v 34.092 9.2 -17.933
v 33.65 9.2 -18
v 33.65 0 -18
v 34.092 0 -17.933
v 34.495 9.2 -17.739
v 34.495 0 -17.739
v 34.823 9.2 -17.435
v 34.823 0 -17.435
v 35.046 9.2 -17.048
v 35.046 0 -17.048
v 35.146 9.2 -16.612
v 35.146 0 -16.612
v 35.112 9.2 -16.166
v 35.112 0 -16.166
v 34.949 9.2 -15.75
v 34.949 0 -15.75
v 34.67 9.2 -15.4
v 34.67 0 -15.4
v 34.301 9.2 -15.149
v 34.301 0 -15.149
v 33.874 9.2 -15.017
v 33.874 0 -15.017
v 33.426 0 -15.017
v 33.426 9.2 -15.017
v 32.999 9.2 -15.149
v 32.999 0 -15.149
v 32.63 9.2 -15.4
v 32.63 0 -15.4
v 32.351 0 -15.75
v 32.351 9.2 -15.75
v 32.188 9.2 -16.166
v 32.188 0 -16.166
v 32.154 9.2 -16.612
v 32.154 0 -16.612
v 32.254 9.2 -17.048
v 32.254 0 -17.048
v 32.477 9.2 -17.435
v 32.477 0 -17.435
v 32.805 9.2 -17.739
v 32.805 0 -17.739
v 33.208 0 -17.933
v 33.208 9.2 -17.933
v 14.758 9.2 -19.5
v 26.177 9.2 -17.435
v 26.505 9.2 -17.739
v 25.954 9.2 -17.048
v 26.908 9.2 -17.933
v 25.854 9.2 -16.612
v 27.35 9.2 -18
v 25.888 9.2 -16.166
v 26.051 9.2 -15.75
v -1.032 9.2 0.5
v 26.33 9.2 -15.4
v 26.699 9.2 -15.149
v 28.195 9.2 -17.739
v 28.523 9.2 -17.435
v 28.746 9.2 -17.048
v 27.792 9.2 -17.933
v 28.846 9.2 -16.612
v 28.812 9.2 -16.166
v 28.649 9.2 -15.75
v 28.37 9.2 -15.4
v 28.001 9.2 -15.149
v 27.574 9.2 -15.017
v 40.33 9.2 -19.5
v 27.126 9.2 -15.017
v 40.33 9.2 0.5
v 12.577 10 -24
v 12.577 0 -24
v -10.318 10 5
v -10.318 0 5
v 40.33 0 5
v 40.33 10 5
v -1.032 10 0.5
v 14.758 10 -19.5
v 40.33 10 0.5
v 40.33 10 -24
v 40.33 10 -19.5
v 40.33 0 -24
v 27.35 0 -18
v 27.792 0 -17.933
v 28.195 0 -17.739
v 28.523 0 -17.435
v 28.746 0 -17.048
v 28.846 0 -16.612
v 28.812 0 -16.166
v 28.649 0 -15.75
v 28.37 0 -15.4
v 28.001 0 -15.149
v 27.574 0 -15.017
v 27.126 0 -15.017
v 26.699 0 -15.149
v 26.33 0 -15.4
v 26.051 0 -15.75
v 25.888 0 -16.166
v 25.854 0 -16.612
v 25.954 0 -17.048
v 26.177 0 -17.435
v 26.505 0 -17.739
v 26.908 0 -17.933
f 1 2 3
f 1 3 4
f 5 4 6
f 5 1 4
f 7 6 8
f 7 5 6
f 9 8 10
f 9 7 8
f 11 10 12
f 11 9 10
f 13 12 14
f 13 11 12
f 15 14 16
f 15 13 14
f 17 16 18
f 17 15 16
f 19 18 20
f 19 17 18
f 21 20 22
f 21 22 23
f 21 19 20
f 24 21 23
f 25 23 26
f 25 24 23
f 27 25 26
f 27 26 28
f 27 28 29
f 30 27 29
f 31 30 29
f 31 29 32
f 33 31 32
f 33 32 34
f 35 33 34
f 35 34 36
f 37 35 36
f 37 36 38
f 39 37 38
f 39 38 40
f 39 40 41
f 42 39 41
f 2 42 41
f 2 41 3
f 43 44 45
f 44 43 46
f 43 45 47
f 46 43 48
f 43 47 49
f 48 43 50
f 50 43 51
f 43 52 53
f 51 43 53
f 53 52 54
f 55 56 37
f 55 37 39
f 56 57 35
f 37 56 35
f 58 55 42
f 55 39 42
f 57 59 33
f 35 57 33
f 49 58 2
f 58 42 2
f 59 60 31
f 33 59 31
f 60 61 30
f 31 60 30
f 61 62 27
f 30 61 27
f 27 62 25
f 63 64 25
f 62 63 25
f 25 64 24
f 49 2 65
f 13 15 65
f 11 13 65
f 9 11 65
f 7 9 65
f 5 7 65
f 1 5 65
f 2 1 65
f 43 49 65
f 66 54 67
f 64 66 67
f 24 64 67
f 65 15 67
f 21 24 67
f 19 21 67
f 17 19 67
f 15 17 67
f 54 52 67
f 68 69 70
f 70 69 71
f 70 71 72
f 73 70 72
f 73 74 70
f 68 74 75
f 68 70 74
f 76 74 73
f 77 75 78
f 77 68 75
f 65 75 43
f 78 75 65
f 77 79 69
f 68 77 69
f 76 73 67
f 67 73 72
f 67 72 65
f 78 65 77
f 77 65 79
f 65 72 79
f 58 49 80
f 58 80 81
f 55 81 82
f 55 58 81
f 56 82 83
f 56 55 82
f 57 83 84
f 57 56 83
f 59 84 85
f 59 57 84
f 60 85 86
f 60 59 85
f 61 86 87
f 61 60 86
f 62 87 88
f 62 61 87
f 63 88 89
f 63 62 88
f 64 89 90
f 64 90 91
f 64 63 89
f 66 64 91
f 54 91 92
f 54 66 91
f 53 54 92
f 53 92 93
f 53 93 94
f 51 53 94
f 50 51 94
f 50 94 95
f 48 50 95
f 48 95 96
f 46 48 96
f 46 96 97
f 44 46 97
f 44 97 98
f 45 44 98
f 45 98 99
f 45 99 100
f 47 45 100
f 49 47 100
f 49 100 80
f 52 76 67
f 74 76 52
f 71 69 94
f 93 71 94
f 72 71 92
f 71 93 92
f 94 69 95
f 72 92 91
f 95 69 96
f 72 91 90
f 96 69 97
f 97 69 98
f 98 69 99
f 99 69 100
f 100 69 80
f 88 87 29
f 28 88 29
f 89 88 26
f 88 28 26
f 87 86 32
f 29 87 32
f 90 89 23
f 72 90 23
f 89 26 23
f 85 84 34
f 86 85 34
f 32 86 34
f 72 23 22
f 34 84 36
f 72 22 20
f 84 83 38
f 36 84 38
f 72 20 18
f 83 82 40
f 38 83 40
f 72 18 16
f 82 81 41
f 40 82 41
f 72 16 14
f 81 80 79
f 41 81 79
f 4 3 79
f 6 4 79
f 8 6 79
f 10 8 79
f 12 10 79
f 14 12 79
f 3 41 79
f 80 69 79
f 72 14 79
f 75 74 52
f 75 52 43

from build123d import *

# Parameters (mm, degrees)
BOSS_EXTRUDE1_DEPTH = 10
CUT_EXTRUDE1_START  = -10
SKETCH2_R           = 1.5
CUT_EXTRUDE1_DEPTH  = 0.8
CUT_EXTRUDE2_START  = -15
SKETCH2_3_R         = 1.5
CUT_EXTRUDE2_DEPTH  = 15
CUT_EXTRUDE3_DEPTH  = 76.909294374


with BuildPart() as part:
    # Sketch1 → Boss-Extrude1 (new body)
    # profile 1 of 2: a face of its own
    with BuildSketch(Plane(origin=(0, 0, 0), x_dir=(1, 0, 0), z_dir=(0, 1, 0))):
        Polygon((71.317746546, -5), (48.423009704, 24), (12.576990296, 24), (-10.317746546, -5), align=None)
        Polygon((15, 19), (0, 0), (61, 0), (46, 19), align=None, mode=Mode.SUBTRACT)
    # profile 2 of 2: a face of its own
    with BuildSketch(Plane(origin=(0, 0, 0), x_dir=(1, 0, 0), z_dir=(0, 1, 0))):
        Polygon((46, 19), (15, 19), (0, 0), (61, 0), align=None)
    extrude(amount=BOSS_EXTRUDE1_DEPTH)

    # Sketch2 → Cut-Extrude1 (cut)
    with BuildSketch(Plane.XZ.offset(CUT_EXTRUDE1_START)):
        Polygon((14.75769903, -19.5), (46.24230097, -19.5), (62.031774655, 0.5), (-1.031774655, 0.5), align=None)
        with Locations(Location((27.35, -16.5, 0), (0, 0, 90))):
            Circle(SKETCH2_R, mode=Mode.SUBTRACT)
        with Locations(Location((33.65, -16.5, 0), (0, 0, 90))):
            Circle(SKETCH2_R, mode=Mode.SUBTRACT)
    extrude(amount=CUT_EXTRUDE1_DEPTH, mode=Mode.SUBTRACT)

    # Sketch2<3> → Cut-Extrude2 (cut)
    with BuildSketch(Plane.XZ.offset(CUT_EXTRUDE2_START)):
        with Locations(Location((27.35, -16.5, 0), (0, 0, 270))):
            Circle(SKETCH2_3_R)
        with Locations(Location((33.65, -16.5, 0), (0, 0, 270))):
            Circle(SKETCH2_3_R)
    extrude(amount=CUT_EXTRUDE2_DEPTH, mode=Mode.SUBTRACT)

    # Sketch3 → Cut-Extrude3 (cut, through all)
    with BuildSketch(Plane.XZ):
        Polygon((40.330212267, 5), (40.330212267, -24), (48.423009704, -24), (71.317746546, 5), align=None)
    extrude(amount=-CUT_EXTRUDE3_DEPTH, mode=Mode.SUBTRACT)


solid = part.part
